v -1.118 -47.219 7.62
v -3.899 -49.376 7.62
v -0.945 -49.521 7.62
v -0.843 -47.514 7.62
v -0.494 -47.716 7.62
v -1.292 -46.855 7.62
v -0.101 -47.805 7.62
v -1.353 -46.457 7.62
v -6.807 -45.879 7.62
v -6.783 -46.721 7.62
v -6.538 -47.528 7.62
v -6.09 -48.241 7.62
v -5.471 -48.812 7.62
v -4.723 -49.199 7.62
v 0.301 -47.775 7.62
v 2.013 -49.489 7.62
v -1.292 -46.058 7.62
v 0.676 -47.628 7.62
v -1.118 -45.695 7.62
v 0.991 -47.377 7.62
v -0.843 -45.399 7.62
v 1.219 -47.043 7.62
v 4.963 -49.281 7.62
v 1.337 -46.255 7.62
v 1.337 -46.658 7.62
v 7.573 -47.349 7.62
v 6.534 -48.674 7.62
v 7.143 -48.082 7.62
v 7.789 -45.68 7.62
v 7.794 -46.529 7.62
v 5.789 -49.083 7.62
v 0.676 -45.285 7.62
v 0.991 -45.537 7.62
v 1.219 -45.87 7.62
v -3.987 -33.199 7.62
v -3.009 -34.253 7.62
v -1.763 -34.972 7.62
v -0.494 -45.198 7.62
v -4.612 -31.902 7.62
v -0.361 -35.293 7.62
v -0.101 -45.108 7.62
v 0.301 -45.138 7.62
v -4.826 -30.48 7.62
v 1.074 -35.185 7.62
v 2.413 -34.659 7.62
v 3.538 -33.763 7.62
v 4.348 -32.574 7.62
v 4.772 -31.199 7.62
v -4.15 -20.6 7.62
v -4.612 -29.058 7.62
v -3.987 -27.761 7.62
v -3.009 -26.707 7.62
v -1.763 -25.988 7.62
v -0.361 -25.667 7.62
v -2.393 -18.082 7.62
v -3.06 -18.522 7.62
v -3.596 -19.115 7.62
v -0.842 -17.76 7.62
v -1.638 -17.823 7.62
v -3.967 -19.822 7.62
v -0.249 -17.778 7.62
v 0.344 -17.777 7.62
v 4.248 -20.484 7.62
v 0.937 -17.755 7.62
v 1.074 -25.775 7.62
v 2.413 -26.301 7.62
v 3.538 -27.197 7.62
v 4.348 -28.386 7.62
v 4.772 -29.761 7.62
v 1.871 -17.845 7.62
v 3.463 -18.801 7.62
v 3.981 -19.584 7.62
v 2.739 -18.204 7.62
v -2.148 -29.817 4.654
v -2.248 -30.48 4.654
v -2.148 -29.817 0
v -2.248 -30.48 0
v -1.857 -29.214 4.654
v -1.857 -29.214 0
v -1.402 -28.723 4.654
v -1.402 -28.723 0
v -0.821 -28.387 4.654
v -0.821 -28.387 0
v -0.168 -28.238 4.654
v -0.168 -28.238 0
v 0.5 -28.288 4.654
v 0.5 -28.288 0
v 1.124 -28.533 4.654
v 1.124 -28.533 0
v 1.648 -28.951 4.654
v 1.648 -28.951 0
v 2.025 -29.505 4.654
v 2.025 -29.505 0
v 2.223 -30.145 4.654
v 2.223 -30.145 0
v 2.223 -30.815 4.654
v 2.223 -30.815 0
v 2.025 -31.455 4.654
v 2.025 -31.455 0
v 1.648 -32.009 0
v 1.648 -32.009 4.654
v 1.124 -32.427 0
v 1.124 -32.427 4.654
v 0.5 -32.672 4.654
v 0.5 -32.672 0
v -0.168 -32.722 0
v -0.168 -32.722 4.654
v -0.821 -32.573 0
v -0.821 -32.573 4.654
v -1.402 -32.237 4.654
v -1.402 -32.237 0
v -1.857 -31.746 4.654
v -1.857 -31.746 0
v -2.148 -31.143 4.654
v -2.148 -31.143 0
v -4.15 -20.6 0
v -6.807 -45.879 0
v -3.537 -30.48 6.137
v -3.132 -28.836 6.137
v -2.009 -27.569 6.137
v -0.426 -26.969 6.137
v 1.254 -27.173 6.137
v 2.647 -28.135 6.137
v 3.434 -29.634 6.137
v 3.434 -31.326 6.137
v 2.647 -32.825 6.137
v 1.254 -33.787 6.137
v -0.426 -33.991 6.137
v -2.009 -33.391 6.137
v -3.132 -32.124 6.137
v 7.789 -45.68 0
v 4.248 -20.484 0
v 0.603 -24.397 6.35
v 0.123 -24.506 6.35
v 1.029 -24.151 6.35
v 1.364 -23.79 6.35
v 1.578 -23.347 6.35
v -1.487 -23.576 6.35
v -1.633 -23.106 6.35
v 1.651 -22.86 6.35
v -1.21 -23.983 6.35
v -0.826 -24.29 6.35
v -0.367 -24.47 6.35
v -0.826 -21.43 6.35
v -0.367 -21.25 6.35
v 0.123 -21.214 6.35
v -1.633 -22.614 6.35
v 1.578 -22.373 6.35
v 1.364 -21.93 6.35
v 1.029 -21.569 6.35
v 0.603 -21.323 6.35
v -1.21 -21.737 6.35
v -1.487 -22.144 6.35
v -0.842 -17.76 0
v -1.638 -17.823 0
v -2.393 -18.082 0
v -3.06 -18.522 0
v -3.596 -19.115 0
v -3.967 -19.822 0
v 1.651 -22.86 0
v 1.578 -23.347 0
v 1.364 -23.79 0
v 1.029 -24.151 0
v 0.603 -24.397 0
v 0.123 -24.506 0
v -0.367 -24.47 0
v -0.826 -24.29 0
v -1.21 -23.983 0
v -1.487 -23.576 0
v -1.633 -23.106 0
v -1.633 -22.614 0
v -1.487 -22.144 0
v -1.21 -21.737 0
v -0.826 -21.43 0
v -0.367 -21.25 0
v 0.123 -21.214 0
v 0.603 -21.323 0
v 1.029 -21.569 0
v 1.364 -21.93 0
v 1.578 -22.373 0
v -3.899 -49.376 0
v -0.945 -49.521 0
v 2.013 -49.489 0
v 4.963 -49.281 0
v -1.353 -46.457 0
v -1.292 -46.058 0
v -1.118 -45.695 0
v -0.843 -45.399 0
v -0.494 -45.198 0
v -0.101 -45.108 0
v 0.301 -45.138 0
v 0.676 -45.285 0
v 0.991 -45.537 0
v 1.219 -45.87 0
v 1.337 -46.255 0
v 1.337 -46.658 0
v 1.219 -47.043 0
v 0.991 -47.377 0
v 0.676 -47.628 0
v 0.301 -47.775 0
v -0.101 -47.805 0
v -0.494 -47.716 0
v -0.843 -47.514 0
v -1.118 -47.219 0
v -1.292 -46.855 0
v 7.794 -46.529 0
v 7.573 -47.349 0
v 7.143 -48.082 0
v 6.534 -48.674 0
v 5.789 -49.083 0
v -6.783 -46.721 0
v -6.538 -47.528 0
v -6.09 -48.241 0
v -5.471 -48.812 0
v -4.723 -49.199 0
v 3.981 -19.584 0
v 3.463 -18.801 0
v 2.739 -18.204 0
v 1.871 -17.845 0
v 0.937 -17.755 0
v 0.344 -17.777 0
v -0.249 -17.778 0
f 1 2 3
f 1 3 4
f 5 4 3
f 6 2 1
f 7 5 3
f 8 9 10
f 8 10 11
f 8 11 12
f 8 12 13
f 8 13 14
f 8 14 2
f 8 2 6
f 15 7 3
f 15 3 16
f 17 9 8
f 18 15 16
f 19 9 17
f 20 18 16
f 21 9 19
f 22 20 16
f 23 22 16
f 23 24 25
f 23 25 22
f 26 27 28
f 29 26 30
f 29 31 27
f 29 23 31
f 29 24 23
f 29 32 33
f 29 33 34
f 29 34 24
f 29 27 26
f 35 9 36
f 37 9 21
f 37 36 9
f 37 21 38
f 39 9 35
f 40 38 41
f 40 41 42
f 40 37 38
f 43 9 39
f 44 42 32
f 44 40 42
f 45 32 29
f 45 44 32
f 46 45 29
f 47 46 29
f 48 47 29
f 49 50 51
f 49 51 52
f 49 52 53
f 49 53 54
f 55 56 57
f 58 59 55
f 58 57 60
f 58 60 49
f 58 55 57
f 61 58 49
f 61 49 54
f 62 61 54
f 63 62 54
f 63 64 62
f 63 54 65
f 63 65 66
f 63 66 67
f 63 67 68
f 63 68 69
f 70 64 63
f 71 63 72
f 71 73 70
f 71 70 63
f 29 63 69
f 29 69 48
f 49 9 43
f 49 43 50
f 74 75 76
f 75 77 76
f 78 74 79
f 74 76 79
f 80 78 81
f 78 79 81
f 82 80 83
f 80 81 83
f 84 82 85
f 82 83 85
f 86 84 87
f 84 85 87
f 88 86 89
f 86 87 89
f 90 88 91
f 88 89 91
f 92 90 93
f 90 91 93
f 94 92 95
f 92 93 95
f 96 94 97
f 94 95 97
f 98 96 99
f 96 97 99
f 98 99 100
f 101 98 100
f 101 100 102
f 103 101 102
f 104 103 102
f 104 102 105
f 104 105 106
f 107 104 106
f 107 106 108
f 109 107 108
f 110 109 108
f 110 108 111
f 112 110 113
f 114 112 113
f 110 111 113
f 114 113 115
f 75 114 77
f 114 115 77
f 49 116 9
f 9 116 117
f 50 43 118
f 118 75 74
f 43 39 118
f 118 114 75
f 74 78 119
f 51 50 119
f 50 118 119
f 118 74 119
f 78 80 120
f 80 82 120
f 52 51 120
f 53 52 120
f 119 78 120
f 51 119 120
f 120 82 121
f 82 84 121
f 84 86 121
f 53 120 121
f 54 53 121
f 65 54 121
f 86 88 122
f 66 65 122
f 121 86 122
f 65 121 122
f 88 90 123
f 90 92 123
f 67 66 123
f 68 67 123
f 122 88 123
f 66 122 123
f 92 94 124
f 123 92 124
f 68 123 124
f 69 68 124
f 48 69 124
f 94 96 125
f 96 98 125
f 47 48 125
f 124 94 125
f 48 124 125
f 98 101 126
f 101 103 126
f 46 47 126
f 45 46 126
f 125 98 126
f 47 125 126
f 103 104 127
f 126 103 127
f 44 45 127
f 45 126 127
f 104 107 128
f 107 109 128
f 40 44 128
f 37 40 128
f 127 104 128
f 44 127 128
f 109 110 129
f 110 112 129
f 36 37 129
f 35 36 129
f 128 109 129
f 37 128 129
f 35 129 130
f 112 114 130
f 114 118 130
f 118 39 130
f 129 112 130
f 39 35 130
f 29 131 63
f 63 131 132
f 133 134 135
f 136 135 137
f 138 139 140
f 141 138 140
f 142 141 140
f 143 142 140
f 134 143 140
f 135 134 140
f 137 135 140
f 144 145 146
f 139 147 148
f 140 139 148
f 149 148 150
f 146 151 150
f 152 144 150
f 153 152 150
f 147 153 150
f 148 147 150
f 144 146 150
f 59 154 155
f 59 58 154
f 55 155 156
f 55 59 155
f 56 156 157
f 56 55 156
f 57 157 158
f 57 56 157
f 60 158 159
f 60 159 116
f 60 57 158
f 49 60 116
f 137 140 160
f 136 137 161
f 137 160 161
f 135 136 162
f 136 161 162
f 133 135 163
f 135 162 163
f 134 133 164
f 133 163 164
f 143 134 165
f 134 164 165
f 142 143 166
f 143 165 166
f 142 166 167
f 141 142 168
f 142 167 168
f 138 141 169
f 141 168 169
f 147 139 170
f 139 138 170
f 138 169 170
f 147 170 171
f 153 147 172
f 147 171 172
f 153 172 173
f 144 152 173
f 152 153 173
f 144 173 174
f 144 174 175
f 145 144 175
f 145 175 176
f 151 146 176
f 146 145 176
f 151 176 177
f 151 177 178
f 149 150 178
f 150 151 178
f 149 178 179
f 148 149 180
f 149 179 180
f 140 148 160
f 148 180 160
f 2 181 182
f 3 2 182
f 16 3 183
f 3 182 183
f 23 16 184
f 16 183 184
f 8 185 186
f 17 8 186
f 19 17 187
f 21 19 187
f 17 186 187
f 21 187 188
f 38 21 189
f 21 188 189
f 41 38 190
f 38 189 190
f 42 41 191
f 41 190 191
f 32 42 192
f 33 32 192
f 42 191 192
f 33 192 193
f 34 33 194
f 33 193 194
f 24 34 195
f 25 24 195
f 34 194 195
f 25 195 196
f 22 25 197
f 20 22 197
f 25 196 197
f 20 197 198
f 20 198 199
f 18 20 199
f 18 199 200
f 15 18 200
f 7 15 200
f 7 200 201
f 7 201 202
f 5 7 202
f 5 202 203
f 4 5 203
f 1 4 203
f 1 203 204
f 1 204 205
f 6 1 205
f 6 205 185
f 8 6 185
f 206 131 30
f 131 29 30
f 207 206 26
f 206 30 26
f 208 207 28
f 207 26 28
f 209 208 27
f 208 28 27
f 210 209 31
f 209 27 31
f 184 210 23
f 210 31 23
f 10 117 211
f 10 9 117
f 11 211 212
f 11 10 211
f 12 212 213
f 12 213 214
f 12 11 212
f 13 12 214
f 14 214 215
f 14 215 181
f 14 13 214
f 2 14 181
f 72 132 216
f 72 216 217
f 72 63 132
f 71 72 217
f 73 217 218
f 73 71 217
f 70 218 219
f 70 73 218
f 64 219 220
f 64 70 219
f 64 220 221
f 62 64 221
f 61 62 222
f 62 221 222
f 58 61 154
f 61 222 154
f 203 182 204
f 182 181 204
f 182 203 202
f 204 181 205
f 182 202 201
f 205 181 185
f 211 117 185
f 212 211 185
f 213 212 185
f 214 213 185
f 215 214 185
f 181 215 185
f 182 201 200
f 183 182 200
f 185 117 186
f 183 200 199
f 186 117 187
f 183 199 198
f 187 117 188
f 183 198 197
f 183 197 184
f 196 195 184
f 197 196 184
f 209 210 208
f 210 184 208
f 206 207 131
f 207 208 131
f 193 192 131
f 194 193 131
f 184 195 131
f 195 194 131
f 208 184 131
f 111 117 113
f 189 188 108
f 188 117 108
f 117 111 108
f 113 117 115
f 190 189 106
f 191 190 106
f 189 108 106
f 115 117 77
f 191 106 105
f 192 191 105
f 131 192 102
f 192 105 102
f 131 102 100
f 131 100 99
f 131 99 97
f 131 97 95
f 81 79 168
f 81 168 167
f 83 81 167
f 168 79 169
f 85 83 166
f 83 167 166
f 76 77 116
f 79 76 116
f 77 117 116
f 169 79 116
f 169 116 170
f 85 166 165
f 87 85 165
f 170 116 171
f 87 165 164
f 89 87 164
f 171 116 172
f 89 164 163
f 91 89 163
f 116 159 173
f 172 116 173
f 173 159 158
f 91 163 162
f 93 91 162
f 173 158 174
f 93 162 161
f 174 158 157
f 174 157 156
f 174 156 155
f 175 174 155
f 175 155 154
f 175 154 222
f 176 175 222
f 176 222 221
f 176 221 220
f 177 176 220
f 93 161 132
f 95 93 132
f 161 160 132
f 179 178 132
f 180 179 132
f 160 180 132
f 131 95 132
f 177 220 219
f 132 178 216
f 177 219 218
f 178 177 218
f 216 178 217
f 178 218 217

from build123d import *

# Parameters (mm, degrees)
F1_DEPTH       = 7.62
F2_R           = 3.175
F4_D           = 2.7051
F6_D           = 4.4958
F6_CSINK_D     = 9.652
F6_CSINK_ANGLE = 82
F7_R           = 1.651
F8_DEPTH       = 7.621
F9_R           = 1.651
F10_DEPTH      = 1.27


with BuildPart() as f1:
    # F0 (on Top) → F1 (new body)
    with BuildSketch(Plane.XY):
        with BuildLine():
            Line((8.2333683595, -48.8408900969), (3.81, -17.3669888006))
            ThreePointArc((3.81, -17.3669888006), (0, -17.78), (-3.81, -17.3669888006))
            Line((-3.81, -17.3669888006), (-7.1361534431, -49.0132248892))
            ThreePointArc((-7.1361534431, -49.0132248892), (0.5553332003, -49.5268866883), (8.2333683595, -48.8408900969))
        make_face()
    extrude(amount=F1_DEPTH)

    # F2
    f2_edges = [f1.edges().sort_by_distance(p)[0] for p in [
        (-7.136153, -49.013225, 3.81),
        (-3.81, -17.366989, 3.81),
        (8.233368, -48.84089, 3.81),
        (3.81, -17.366989, 3.81),
    ]]
    fillet(f2_edges, radius=F2_R)

    # F4 (through all)
    with Locations(Plane.XY.offset(7.62)):
        with Locations((0, -46.4566)):
            Hole(F4_D / 2)

    # F6 (through all)
    with Locations(Plane.XY.offset(7.62)):
        with Locations((0, -30.48)):
            CounterSinkHole(F6_D / 2, F6_CSINK_D / 2, counter_sink_angle=F6_CSINK_ANGLE)

    # F7 (on face) → F8 (cut, through all)
    with BuildSketch(Plane(origin=(0, 0, 0), x_dir=(1, 0, 0), z_dir=(0, 0, -1))):
        with Locations((0, 22.86)):
            Circle(F7_R)
    extrude(amount=-F8_DEPTH, mode=Mode.SUBTRACT)

    # F9 (on face) → F10 (join)
    with BuildSketch(Plane.XY.offset(7.62)):
        with Locations((0, -22.86)):
            Circle(F9_R)
    extrude(amount=-F10_DEPTH)


solid = f1.part
